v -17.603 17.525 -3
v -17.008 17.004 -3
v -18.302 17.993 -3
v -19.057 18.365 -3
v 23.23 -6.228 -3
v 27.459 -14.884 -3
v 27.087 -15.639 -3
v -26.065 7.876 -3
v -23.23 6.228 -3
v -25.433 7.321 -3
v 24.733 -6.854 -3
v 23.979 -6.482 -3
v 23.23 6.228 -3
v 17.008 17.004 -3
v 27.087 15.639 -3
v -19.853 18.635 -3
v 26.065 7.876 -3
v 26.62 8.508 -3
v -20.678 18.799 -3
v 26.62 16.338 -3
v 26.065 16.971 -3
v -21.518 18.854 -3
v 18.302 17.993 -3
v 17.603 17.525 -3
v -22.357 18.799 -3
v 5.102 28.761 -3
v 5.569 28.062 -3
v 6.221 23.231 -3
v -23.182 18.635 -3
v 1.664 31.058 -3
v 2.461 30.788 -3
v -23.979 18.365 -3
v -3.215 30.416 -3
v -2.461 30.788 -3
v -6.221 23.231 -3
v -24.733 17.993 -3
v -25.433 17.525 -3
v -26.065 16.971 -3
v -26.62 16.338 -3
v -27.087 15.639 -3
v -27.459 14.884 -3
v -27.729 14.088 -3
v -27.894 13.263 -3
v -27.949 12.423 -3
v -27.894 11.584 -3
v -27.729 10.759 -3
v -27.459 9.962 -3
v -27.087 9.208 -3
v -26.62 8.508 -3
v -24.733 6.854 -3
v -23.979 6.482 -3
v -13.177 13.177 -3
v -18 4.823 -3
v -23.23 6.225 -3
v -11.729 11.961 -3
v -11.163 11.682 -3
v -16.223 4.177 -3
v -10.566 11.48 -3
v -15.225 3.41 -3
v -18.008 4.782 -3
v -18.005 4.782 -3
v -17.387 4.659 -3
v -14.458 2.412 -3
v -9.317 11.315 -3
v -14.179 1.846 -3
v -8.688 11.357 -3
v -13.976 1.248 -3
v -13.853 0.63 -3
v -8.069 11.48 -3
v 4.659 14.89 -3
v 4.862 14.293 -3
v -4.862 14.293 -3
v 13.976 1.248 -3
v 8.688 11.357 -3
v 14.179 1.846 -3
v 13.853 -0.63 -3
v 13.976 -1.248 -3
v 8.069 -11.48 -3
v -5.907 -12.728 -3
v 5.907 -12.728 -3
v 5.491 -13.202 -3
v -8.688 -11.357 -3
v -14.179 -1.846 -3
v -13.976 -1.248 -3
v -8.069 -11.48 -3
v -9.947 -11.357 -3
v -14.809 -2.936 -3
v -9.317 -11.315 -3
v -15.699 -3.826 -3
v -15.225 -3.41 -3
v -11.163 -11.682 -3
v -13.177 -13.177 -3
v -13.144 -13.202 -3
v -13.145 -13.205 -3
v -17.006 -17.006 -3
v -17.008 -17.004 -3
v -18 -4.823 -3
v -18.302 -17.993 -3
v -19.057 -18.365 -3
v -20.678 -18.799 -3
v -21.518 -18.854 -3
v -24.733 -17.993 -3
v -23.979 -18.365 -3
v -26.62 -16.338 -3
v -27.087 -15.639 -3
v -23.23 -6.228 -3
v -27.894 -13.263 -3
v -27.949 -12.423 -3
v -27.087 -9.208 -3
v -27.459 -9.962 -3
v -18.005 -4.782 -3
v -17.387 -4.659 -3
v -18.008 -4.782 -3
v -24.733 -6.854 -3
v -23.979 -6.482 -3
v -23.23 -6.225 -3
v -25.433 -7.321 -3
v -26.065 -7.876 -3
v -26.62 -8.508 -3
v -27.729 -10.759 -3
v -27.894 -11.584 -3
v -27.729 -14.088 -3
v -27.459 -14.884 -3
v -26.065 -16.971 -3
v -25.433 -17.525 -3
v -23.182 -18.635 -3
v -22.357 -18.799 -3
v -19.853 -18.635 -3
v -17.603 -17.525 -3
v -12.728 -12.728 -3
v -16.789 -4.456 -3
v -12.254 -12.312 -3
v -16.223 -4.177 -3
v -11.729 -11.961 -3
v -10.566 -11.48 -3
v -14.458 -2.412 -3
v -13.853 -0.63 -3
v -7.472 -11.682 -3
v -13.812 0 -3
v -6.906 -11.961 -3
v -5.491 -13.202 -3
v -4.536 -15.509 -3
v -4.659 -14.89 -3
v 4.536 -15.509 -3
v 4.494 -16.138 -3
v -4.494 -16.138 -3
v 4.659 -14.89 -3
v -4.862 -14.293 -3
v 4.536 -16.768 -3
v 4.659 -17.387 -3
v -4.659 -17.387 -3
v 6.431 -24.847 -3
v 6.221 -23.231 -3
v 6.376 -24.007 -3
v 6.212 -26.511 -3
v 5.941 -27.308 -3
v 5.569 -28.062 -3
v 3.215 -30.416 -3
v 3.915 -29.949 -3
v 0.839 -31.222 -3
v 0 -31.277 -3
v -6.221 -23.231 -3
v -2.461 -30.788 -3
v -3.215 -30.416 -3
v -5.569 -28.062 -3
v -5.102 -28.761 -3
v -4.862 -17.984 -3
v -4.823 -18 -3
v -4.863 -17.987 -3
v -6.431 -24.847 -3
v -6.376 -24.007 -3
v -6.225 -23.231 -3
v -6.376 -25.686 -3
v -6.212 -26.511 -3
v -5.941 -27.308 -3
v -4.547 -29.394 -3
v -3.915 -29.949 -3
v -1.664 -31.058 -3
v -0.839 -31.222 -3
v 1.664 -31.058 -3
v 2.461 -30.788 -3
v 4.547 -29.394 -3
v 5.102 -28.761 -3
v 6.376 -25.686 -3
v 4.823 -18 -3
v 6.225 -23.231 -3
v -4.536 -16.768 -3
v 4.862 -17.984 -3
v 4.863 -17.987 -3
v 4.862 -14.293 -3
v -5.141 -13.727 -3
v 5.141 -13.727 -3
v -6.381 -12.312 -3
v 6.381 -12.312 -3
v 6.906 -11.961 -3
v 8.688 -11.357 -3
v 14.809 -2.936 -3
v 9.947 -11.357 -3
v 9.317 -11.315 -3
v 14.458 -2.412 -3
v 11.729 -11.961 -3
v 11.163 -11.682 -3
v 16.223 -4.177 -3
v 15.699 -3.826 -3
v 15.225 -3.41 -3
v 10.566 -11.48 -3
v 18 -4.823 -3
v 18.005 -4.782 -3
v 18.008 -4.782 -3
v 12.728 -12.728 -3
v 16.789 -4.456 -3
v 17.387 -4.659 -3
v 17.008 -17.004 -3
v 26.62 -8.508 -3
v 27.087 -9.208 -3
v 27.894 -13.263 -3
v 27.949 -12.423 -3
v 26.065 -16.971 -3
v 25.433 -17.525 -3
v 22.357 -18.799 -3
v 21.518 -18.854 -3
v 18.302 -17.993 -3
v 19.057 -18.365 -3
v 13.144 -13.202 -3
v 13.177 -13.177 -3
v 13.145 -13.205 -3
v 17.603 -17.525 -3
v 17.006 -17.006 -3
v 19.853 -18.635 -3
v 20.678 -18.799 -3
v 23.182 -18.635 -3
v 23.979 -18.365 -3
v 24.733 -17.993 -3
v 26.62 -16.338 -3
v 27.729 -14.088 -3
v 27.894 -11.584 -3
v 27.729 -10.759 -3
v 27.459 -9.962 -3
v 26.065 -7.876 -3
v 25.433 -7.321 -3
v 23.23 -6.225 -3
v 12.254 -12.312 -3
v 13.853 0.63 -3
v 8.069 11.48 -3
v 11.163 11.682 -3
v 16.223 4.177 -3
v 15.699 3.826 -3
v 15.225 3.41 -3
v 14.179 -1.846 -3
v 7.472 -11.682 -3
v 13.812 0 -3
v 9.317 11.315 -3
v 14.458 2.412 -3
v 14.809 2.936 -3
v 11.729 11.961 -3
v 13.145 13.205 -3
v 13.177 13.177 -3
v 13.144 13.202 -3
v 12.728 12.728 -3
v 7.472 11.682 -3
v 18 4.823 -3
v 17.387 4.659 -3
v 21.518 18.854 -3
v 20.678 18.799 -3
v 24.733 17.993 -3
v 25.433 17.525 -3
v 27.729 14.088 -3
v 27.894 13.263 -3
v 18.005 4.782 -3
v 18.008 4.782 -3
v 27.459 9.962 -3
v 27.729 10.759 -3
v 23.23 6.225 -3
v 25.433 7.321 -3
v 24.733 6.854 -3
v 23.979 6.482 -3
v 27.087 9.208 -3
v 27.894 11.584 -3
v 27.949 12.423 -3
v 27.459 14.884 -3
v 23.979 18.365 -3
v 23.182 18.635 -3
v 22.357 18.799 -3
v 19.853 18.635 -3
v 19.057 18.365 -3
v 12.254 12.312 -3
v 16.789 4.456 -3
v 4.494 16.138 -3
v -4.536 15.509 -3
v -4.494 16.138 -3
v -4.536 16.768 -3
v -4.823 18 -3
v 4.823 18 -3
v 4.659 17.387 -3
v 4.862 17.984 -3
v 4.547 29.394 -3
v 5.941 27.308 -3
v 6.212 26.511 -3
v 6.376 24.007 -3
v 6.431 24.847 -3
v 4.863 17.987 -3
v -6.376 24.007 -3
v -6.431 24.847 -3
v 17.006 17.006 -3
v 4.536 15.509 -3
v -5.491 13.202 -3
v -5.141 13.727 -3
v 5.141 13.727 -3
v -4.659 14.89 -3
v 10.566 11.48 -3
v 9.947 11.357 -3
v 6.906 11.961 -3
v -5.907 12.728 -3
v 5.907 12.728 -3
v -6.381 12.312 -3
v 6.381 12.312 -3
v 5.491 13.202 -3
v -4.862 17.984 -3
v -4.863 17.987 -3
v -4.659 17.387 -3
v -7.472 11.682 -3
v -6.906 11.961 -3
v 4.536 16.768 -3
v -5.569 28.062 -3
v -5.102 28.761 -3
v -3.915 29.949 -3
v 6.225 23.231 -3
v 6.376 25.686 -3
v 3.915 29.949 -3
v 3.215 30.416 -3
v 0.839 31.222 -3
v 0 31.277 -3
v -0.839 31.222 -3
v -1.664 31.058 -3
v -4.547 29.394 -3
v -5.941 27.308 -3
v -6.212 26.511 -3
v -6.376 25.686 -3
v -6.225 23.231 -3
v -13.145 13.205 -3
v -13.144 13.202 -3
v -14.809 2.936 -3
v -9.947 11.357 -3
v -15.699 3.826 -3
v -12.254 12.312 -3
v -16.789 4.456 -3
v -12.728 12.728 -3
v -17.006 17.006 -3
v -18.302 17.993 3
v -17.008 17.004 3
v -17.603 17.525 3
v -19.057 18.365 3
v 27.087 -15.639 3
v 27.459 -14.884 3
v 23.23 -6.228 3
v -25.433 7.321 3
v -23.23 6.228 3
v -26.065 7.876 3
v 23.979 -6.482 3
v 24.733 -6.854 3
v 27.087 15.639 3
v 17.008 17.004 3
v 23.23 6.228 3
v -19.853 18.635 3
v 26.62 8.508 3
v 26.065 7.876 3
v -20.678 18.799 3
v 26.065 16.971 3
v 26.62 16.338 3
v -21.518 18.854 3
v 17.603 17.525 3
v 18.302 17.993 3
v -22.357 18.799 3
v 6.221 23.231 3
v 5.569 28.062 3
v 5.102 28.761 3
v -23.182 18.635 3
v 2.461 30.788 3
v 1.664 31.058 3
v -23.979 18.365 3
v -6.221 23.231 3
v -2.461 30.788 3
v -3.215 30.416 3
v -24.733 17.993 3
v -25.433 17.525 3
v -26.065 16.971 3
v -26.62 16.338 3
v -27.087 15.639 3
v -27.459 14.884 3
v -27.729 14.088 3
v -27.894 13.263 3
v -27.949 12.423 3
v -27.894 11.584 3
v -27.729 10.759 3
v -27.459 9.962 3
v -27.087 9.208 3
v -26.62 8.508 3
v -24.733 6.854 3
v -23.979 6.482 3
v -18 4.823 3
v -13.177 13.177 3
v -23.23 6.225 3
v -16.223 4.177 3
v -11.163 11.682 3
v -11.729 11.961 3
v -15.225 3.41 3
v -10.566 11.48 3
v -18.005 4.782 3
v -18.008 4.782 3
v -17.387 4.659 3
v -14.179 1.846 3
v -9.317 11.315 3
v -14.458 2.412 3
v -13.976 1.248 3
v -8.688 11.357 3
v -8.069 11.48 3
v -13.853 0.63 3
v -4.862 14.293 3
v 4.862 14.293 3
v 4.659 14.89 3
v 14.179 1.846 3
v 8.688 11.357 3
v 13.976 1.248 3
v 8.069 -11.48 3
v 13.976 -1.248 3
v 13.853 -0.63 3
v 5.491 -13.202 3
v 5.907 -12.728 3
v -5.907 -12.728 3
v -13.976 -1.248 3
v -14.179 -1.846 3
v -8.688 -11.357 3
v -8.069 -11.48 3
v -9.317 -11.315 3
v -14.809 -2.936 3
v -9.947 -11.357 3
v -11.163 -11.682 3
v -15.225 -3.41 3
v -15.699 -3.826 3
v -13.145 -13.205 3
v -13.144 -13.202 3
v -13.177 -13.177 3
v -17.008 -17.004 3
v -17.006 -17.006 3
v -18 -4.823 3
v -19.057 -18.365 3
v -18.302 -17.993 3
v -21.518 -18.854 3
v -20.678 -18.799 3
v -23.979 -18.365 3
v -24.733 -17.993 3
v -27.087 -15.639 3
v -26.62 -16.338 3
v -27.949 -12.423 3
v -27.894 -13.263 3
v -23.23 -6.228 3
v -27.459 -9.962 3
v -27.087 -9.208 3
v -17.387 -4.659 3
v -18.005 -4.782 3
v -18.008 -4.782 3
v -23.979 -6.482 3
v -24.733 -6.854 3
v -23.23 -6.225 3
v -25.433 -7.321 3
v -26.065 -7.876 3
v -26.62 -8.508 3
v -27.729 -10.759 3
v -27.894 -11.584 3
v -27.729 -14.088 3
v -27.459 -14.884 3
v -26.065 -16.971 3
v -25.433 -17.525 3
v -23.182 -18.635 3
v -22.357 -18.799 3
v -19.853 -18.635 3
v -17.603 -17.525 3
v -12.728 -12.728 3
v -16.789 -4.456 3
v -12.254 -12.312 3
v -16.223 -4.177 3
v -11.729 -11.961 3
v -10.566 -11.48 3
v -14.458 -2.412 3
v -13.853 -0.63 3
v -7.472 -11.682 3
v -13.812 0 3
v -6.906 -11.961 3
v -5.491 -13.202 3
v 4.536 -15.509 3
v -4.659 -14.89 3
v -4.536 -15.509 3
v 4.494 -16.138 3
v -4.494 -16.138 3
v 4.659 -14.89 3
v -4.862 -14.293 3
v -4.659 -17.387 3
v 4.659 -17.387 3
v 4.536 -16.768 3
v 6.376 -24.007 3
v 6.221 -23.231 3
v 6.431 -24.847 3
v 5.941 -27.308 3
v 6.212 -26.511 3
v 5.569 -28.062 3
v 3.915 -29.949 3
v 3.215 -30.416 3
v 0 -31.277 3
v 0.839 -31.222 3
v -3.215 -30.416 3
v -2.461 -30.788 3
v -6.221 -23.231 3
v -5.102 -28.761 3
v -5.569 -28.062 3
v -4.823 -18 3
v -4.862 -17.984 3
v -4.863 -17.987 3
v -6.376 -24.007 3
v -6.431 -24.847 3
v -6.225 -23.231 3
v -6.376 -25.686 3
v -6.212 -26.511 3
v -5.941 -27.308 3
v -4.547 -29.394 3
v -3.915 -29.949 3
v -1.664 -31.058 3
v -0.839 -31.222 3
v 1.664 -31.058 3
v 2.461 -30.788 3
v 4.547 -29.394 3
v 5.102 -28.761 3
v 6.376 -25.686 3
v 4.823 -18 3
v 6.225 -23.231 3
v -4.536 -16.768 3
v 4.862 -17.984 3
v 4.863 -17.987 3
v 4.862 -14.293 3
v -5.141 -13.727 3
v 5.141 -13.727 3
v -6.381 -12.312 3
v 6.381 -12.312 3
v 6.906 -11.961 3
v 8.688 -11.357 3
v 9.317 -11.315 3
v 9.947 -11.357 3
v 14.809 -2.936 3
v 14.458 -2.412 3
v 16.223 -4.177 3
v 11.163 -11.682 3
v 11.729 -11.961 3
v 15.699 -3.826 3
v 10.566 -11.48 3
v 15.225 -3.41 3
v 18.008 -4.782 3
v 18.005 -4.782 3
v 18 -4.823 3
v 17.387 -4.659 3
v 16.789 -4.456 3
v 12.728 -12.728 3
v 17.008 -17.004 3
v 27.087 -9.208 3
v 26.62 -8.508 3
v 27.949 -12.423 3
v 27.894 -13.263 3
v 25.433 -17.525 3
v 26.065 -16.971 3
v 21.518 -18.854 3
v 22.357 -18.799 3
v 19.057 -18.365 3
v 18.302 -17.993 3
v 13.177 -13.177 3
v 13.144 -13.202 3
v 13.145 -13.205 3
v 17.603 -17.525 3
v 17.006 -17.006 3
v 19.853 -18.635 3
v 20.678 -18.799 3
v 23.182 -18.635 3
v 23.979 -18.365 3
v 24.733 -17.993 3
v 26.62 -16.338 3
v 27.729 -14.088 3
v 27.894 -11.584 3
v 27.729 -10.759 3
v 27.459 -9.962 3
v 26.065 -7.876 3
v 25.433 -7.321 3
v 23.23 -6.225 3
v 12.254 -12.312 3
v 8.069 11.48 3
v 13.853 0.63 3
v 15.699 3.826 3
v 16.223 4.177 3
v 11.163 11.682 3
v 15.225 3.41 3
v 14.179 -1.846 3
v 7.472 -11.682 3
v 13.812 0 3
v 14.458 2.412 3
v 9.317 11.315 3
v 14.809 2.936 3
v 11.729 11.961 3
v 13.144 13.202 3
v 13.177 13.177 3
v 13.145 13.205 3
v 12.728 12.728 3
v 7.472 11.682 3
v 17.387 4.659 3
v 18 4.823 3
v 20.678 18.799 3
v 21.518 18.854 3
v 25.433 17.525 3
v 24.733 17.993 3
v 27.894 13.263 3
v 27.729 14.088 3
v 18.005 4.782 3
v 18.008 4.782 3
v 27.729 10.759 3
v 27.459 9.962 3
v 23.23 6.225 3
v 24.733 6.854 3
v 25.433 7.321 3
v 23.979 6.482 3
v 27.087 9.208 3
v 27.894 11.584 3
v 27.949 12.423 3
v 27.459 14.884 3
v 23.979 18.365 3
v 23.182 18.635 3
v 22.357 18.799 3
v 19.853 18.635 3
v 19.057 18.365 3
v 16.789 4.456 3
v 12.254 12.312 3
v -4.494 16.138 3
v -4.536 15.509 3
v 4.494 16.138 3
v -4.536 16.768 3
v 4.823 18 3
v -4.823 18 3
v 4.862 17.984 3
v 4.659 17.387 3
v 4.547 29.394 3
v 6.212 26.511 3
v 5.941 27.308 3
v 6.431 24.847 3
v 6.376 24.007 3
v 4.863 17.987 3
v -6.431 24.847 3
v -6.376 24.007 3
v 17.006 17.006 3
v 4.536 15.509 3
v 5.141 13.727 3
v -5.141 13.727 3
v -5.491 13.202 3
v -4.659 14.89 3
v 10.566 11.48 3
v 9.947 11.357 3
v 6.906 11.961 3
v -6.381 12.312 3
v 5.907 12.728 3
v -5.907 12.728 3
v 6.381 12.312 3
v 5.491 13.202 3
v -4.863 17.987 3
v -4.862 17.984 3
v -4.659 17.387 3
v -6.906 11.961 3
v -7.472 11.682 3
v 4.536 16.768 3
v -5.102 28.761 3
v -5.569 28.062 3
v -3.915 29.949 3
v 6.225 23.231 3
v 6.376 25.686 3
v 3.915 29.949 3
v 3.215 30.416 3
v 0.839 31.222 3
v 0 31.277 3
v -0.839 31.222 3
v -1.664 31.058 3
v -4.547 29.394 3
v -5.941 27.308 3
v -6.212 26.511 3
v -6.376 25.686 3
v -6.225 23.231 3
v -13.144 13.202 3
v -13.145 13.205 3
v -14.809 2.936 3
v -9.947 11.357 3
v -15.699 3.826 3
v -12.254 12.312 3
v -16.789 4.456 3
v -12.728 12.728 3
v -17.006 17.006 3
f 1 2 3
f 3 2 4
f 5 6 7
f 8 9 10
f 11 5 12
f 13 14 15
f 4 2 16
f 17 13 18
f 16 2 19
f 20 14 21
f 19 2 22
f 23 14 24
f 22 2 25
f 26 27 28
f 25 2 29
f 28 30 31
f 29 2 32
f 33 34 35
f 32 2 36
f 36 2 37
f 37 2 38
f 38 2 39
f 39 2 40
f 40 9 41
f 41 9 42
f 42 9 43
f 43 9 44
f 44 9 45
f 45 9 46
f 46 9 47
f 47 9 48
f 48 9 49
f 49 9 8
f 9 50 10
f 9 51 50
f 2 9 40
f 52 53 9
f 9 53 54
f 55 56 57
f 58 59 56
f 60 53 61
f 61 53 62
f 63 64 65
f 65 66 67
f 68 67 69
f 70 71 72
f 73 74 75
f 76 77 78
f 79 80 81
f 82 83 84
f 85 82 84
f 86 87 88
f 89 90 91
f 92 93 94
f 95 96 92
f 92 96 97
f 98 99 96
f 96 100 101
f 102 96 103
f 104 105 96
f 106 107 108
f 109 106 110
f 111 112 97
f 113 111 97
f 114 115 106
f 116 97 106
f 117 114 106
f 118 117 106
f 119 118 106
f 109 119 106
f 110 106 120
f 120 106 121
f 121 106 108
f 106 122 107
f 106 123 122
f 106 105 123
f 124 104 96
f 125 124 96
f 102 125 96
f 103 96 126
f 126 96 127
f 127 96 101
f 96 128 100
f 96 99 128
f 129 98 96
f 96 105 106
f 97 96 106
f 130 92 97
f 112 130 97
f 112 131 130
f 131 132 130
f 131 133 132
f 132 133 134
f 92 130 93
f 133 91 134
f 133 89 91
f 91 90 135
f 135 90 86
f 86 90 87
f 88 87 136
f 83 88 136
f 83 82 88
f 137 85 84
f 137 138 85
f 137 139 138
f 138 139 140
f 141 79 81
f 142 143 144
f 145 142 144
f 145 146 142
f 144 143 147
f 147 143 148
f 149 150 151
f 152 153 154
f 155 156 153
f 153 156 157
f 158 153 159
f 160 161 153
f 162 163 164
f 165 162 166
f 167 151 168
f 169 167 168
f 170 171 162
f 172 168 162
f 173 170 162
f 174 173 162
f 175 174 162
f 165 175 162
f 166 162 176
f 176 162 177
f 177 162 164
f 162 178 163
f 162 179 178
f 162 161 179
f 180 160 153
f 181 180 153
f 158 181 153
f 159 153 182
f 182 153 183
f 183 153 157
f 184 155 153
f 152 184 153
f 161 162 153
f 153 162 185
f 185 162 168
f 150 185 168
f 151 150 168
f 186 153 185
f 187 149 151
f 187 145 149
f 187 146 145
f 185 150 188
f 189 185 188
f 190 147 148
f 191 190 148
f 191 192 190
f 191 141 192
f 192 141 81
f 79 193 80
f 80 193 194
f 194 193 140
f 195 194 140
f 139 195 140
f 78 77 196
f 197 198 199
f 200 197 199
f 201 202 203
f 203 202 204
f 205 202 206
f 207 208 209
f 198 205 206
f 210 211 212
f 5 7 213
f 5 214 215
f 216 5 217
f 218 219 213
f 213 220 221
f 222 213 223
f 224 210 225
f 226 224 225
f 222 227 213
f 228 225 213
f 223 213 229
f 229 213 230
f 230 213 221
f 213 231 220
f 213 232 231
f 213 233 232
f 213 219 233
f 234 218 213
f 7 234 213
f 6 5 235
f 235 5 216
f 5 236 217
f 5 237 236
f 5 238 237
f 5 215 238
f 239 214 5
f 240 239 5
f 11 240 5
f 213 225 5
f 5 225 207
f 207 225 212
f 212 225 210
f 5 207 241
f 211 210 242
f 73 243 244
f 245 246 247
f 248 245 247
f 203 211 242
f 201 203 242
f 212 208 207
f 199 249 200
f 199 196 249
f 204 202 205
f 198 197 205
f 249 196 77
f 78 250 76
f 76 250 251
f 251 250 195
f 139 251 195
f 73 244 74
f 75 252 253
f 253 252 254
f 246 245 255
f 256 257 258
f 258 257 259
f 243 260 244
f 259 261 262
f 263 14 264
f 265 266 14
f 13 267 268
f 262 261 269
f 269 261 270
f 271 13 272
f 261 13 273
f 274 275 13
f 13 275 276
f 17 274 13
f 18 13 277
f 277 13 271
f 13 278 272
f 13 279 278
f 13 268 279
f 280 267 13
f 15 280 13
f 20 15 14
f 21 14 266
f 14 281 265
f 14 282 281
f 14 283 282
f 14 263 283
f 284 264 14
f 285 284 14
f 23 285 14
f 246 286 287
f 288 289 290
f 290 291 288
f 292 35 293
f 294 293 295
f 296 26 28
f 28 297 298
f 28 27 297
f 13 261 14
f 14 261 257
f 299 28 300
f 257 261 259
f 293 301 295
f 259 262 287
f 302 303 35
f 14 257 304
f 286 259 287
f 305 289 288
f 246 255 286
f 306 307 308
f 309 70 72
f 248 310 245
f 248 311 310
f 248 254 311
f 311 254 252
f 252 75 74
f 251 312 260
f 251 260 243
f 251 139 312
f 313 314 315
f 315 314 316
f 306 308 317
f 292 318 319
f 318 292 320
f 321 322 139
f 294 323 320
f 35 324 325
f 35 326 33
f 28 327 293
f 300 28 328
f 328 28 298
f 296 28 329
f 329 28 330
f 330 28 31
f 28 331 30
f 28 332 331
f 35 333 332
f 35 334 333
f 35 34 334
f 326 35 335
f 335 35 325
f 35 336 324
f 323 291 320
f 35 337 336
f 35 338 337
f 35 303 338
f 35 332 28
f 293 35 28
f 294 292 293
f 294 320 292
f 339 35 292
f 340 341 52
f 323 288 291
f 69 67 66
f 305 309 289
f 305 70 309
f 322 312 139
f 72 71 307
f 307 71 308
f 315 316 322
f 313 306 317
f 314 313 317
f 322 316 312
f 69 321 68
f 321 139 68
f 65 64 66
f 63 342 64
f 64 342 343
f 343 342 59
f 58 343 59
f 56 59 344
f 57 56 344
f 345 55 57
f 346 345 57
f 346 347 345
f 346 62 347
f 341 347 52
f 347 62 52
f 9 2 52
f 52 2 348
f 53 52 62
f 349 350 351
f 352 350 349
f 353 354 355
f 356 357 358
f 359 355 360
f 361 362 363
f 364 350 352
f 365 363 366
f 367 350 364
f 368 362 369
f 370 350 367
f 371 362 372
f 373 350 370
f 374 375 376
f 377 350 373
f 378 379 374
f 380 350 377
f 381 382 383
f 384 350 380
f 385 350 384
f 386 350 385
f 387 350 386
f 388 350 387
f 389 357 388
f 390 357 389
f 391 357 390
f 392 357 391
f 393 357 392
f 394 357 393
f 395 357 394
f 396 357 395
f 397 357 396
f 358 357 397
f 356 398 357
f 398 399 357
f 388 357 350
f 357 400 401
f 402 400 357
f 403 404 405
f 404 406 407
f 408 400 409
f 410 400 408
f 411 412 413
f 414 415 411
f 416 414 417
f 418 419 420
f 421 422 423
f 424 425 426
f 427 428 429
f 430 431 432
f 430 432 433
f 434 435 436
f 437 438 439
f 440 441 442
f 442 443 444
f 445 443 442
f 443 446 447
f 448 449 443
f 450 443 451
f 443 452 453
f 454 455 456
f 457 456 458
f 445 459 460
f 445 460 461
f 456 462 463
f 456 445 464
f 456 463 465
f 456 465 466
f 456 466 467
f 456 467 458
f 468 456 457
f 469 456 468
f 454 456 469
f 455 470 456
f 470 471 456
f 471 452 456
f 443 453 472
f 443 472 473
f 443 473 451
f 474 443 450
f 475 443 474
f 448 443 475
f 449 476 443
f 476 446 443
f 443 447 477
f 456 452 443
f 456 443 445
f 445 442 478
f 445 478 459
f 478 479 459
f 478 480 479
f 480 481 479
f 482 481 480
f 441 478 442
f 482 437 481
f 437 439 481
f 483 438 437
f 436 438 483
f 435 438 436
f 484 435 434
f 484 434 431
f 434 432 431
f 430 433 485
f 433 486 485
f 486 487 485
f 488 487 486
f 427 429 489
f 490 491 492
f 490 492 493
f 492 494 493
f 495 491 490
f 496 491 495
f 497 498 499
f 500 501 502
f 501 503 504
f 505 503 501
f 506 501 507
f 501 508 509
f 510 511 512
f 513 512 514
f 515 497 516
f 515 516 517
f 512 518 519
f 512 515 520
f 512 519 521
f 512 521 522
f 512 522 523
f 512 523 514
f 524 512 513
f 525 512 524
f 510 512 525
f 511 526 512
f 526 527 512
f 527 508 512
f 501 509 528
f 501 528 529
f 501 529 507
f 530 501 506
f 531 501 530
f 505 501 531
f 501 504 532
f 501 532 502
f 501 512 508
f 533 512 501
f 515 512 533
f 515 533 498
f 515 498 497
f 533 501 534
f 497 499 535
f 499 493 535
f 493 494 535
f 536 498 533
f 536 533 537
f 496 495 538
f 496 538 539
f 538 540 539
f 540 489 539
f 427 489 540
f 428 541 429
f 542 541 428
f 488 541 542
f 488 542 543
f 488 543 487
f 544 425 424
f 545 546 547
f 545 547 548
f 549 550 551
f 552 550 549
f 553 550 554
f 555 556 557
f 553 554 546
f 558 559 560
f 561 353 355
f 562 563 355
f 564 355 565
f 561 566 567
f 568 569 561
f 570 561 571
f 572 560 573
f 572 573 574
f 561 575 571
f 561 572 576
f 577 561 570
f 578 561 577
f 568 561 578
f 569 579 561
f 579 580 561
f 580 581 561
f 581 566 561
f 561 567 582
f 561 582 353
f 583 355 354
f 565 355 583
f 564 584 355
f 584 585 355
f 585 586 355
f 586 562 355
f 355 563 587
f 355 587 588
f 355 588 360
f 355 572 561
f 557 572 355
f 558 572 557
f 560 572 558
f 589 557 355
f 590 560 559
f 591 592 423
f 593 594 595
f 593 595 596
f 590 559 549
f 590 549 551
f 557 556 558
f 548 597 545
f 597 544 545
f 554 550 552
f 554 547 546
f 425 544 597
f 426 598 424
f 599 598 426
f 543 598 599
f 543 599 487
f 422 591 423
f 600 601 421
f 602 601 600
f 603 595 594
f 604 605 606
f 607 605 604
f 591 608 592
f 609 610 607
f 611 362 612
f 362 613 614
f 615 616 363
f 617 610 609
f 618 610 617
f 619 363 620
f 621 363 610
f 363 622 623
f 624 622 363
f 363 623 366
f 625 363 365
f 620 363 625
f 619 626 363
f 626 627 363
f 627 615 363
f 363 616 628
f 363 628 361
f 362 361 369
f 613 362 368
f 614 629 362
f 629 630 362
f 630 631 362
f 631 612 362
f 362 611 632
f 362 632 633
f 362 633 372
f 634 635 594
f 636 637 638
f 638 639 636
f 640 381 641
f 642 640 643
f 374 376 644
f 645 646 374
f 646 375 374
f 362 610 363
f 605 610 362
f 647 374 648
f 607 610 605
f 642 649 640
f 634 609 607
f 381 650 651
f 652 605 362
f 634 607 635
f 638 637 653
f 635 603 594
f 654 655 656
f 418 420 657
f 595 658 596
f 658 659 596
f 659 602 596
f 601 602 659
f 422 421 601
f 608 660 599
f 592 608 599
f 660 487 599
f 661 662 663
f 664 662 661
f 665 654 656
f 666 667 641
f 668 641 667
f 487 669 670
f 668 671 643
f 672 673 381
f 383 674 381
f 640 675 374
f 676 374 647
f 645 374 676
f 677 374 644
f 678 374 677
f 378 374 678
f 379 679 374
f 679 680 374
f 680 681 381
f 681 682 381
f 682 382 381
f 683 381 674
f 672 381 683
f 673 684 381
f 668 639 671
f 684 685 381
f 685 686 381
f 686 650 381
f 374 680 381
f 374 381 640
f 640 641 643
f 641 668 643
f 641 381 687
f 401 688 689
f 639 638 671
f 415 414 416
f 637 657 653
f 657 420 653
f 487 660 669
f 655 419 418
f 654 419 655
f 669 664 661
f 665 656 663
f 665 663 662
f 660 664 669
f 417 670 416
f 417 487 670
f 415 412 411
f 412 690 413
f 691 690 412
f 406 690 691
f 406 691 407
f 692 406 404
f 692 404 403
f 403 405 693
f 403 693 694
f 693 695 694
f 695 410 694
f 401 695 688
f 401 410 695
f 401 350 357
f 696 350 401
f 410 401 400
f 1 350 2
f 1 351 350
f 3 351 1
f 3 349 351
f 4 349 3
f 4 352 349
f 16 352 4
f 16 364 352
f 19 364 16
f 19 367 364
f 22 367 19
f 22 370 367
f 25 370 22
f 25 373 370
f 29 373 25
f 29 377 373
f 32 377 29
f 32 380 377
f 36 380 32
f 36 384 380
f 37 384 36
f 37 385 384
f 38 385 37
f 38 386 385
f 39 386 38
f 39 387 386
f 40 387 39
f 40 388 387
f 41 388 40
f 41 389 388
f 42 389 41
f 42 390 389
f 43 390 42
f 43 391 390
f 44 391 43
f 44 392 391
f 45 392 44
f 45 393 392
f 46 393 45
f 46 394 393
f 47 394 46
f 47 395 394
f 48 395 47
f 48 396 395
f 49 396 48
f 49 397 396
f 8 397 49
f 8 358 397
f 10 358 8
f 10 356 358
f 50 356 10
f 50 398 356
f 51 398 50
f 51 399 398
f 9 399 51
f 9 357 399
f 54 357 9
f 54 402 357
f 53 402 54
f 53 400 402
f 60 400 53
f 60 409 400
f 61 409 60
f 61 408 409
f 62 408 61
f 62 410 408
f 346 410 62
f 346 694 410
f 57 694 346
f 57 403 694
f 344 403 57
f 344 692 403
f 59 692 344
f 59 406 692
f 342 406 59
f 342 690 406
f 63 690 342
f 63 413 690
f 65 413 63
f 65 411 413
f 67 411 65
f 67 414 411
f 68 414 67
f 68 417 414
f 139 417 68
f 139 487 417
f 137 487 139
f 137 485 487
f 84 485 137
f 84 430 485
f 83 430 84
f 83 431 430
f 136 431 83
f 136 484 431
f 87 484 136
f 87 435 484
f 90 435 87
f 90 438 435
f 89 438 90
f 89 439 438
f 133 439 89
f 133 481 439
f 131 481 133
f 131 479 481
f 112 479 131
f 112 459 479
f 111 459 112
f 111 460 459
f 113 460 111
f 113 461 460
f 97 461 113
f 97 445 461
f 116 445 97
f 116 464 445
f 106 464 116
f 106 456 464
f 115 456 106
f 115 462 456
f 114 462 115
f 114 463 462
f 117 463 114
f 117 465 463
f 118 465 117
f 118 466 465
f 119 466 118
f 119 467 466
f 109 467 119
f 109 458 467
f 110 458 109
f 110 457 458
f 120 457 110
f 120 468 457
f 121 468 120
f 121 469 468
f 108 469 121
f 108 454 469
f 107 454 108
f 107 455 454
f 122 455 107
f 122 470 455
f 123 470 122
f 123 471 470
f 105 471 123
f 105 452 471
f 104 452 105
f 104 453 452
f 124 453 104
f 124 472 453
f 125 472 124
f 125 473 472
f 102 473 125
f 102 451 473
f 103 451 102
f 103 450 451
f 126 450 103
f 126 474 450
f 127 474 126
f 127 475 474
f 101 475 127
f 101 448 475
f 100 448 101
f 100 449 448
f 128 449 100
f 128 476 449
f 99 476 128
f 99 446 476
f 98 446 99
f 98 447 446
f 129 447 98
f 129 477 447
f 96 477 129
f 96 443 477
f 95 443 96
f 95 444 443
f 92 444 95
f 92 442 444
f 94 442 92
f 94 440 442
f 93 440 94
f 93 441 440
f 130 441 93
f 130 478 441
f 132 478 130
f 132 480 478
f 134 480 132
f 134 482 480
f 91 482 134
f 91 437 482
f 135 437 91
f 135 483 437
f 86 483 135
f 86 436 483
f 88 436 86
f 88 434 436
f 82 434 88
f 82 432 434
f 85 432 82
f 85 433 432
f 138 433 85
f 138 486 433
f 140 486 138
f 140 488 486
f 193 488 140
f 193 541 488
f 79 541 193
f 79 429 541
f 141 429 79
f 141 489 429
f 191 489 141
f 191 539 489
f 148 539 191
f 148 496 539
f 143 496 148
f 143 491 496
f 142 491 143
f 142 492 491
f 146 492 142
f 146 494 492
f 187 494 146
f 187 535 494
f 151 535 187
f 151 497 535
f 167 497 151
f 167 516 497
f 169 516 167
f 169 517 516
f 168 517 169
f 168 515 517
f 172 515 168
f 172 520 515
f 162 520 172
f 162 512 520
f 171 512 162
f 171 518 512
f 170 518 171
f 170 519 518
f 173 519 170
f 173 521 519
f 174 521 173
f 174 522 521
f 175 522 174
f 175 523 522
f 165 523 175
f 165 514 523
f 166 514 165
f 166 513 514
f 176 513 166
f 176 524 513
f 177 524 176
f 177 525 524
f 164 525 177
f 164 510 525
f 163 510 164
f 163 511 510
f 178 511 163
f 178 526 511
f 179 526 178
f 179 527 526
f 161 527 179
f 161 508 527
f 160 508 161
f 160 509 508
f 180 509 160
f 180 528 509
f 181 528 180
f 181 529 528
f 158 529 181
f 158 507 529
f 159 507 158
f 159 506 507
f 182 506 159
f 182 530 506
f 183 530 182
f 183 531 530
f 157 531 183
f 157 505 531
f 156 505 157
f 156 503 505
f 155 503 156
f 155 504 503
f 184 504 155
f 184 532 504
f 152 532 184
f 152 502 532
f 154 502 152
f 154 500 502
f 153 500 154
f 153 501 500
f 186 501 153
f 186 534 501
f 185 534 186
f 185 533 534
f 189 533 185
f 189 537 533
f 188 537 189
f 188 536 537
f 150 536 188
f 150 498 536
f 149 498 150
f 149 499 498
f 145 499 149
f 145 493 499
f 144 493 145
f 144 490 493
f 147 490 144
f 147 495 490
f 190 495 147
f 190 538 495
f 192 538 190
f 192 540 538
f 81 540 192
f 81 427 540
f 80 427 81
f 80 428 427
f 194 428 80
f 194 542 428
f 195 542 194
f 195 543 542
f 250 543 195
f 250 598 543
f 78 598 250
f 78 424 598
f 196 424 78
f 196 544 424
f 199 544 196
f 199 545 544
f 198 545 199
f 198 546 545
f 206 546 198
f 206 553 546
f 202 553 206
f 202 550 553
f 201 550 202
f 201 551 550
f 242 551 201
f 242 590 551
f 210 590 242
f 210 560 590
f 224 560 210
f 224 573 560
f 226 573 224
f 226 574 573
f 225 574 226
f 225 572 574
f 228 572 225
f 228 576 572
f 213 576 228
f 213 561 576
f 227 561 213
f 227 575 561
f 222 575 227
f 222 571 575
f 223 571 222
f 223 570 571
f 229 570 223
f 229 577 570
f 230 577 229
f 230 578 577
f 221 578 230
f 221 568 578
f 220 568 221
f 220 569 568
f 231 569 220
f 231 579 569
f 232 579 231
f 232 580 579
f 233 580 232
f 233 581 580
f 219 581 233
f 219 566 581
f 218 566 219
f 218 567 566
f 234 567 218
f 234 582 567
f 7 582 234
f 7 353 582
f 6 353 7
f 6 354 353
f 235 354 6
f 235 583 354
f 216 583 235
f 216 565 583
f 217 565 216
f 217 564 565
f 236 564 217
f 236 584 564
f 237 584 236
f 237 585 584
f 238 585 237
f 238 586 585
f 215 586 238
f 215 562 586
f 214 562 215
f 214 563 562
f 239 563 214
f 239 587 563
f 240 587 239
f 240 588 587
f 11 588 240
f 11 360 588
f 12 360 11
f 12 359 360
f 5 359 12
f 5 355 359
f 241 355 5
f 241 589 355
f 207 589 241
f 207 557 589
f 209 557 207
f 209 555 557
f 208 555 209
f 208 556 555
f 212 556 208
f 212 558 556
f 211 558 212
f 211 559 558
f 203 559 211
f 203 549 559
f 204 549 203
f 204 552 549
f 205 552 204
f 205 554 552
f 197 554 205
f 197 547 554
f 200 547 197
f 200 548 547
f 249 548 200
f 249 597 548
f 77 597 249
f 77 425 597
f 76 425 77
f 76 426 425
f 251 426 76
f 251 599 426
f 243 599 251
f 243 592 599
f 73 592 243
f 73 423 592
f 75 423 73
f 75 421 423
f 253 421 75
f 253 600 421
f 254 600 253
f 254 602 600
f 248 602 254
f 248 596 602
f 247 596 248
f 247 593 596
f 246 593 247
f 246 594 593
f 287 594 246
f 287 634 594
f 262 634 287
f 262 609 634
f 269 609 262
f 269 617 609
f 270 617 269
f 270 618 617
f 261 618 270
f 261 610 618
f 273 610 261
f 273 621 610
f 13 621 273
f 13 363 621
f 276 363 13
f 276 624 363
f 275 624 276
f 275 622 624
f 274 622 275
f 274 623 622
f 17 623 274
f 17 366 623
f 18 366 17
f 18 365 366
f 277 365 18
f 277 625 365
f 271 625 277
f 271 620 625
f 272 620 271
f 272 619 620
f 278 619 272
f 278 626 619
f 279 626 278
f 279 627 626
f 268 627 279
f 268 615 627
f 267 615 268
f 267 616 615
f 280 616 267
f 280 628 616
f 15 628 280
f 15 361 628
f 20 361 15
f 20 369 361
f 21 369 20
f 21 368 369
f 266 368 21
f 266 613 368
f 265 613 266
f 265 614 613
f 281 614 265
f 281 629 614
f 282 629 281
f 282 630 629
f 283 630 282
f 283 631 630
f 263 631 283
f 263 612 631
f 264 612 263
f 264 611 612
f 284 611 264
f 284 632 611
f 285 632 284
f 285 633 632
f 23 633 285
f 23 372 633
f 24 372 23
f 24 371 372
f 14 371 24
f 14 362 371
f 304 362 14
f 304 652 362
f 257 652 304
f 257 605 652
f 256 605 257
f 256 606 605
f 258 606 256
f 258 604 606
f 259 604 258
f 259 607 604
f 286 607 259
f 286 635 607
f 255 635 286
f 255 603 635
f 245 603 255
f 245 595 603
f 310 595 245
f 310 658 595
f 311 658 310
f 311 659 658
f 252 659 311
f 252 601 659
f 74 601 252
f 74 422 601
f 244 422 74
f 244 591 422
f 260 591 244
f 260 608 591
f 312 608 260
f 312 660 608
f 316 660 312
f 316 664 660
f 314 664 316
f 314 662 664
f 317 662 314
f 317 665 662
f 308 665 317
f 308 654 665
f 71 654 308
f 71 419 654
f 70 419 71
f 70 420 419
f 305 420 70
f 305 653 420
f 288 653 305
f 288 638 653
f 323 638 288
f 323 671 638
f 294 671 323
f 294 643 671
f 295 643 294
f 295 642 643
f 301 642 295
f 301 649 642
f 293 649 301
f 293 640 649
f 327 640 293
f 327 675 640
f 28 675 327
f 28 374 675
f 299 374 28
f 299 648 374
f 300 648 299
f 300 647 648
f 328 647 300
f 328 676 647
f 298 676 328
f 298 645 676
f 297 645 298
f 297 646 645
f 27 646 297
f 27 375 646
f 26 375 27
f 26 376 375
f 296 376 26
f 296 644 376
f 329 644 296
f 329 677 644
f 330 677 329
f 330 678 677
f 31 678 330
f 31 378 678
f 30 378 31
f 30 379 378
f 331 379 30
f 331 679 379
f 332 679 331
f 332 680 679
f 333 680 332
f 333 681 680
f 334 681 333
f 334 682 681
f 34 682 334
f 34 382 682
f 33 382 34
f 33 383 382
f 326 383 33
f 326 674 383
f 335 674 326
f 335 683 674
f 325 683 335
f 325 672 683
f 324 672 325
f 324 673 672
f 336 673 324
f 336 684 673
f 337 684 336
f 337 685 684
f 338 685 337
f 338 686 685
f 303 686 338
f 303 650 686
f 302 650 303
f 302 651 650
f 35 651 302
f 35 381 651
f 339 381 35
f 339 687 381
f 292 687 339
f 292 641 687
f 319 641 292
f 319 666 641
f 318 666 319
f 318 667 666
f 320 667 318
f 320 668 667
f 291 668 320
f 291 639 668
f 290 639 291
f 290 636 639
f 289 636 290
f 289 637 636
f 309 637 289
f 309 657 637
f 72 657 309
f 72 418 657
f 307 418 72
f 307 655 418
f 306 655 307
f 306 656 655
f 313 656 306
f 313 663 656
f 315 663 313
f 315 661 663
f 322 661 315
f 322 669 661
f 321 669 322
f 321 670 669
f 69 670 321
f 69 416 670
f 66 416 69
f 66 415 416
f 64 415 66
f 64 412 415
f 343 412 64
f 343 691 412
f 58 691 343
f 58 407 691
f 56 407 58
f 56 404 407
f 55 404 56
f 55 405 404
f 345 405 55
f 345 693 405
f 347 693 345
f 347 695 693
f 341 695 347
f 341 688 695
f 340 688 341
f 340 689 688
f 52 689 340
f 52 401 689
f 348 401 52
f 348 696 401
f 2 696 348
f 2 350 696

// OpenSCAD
// stretchy bands

// (not including the curved parts)
_1_insideDiameter = 36; //[1:300]

// (not including the curved parts)
_2_outsideDiameter = 48; //[1:300]

_3_height = 6; //[1:100]

// number of loops around the ring
_4_radialCount = 6; //[2:60]

// twist
_5_twist = 0.0;

// number of slices per mm
_6_slices = 1;

// (of the arcs)
_7_resolution = 48; //[24:Low, 36:Medium, 48:High, 64:VeryHigh]



linear_extrude( height = _3_height,
	center = true,
	convexity = _4_radialCount,
	twist = _5_twist,
	slices = _5_twist == 0 ? 1 : max(1,_6_slices*_3_height) )

	stretchyShape(	_1_insideDiameter > _2_outsideDiameter ? _2_outsideDiameter/2 : _1_insideDiameter/2, 
					_2_outsideDiameter/2, 
					_4_radialCount, 
					0, 
					$fn=_7_resolution
);


module stretchyShape(r1, r2, count, thickness) {

	angle = 180/count;
	eps = 0.1;
	overlap = 2;

	cord2 = 2 * r2 * sin(angle/2);
	outsideArc = 180 + angle + overlap;
	outsideRadius = cord2/sin(90-angle/2)/2;
	outsideOffset = r2 * cos(angle/2) + cos(90-angle/2) * outsideRadius;

	insideArc = 180 - angle + overlap;
	cord1 = 2 * r1 * sin(angle/2);
	insideRadius = cord1/sin(90-angle/2)/2;
	insideOffset = r1 * cos(angle/2) + cos(90-angle/2) * insideRadius;

	union()
	{
		for(a = [0:angle*2:360])
			rotate([0,0,a])
				for(b=[0,angle])
					rotate([0,0,angle/2 - b])
						translate( [(b==0?+1:-1)*insideRadius,r1 + (r2-r1)/2,0] )
							square( [insideRadius*2+thickness, r2 - r1 + eps], center=true);

	for(a = [0:angle*2:360])
		rotate([0,0,a])
			translate([0,outsideOffset,0])
				circle( r = outsideRadius+thickness/2, center = true );
	
	difference()
	{
		circle( r = insideOffset, center = true );	
		for(a = [0:angle*2:360])
			rotate([0,0,a+angle])
				translate([0,insideOffset,0])
					circle(r = insideRadius-thickness/2, center = true );
	}
	}
}
